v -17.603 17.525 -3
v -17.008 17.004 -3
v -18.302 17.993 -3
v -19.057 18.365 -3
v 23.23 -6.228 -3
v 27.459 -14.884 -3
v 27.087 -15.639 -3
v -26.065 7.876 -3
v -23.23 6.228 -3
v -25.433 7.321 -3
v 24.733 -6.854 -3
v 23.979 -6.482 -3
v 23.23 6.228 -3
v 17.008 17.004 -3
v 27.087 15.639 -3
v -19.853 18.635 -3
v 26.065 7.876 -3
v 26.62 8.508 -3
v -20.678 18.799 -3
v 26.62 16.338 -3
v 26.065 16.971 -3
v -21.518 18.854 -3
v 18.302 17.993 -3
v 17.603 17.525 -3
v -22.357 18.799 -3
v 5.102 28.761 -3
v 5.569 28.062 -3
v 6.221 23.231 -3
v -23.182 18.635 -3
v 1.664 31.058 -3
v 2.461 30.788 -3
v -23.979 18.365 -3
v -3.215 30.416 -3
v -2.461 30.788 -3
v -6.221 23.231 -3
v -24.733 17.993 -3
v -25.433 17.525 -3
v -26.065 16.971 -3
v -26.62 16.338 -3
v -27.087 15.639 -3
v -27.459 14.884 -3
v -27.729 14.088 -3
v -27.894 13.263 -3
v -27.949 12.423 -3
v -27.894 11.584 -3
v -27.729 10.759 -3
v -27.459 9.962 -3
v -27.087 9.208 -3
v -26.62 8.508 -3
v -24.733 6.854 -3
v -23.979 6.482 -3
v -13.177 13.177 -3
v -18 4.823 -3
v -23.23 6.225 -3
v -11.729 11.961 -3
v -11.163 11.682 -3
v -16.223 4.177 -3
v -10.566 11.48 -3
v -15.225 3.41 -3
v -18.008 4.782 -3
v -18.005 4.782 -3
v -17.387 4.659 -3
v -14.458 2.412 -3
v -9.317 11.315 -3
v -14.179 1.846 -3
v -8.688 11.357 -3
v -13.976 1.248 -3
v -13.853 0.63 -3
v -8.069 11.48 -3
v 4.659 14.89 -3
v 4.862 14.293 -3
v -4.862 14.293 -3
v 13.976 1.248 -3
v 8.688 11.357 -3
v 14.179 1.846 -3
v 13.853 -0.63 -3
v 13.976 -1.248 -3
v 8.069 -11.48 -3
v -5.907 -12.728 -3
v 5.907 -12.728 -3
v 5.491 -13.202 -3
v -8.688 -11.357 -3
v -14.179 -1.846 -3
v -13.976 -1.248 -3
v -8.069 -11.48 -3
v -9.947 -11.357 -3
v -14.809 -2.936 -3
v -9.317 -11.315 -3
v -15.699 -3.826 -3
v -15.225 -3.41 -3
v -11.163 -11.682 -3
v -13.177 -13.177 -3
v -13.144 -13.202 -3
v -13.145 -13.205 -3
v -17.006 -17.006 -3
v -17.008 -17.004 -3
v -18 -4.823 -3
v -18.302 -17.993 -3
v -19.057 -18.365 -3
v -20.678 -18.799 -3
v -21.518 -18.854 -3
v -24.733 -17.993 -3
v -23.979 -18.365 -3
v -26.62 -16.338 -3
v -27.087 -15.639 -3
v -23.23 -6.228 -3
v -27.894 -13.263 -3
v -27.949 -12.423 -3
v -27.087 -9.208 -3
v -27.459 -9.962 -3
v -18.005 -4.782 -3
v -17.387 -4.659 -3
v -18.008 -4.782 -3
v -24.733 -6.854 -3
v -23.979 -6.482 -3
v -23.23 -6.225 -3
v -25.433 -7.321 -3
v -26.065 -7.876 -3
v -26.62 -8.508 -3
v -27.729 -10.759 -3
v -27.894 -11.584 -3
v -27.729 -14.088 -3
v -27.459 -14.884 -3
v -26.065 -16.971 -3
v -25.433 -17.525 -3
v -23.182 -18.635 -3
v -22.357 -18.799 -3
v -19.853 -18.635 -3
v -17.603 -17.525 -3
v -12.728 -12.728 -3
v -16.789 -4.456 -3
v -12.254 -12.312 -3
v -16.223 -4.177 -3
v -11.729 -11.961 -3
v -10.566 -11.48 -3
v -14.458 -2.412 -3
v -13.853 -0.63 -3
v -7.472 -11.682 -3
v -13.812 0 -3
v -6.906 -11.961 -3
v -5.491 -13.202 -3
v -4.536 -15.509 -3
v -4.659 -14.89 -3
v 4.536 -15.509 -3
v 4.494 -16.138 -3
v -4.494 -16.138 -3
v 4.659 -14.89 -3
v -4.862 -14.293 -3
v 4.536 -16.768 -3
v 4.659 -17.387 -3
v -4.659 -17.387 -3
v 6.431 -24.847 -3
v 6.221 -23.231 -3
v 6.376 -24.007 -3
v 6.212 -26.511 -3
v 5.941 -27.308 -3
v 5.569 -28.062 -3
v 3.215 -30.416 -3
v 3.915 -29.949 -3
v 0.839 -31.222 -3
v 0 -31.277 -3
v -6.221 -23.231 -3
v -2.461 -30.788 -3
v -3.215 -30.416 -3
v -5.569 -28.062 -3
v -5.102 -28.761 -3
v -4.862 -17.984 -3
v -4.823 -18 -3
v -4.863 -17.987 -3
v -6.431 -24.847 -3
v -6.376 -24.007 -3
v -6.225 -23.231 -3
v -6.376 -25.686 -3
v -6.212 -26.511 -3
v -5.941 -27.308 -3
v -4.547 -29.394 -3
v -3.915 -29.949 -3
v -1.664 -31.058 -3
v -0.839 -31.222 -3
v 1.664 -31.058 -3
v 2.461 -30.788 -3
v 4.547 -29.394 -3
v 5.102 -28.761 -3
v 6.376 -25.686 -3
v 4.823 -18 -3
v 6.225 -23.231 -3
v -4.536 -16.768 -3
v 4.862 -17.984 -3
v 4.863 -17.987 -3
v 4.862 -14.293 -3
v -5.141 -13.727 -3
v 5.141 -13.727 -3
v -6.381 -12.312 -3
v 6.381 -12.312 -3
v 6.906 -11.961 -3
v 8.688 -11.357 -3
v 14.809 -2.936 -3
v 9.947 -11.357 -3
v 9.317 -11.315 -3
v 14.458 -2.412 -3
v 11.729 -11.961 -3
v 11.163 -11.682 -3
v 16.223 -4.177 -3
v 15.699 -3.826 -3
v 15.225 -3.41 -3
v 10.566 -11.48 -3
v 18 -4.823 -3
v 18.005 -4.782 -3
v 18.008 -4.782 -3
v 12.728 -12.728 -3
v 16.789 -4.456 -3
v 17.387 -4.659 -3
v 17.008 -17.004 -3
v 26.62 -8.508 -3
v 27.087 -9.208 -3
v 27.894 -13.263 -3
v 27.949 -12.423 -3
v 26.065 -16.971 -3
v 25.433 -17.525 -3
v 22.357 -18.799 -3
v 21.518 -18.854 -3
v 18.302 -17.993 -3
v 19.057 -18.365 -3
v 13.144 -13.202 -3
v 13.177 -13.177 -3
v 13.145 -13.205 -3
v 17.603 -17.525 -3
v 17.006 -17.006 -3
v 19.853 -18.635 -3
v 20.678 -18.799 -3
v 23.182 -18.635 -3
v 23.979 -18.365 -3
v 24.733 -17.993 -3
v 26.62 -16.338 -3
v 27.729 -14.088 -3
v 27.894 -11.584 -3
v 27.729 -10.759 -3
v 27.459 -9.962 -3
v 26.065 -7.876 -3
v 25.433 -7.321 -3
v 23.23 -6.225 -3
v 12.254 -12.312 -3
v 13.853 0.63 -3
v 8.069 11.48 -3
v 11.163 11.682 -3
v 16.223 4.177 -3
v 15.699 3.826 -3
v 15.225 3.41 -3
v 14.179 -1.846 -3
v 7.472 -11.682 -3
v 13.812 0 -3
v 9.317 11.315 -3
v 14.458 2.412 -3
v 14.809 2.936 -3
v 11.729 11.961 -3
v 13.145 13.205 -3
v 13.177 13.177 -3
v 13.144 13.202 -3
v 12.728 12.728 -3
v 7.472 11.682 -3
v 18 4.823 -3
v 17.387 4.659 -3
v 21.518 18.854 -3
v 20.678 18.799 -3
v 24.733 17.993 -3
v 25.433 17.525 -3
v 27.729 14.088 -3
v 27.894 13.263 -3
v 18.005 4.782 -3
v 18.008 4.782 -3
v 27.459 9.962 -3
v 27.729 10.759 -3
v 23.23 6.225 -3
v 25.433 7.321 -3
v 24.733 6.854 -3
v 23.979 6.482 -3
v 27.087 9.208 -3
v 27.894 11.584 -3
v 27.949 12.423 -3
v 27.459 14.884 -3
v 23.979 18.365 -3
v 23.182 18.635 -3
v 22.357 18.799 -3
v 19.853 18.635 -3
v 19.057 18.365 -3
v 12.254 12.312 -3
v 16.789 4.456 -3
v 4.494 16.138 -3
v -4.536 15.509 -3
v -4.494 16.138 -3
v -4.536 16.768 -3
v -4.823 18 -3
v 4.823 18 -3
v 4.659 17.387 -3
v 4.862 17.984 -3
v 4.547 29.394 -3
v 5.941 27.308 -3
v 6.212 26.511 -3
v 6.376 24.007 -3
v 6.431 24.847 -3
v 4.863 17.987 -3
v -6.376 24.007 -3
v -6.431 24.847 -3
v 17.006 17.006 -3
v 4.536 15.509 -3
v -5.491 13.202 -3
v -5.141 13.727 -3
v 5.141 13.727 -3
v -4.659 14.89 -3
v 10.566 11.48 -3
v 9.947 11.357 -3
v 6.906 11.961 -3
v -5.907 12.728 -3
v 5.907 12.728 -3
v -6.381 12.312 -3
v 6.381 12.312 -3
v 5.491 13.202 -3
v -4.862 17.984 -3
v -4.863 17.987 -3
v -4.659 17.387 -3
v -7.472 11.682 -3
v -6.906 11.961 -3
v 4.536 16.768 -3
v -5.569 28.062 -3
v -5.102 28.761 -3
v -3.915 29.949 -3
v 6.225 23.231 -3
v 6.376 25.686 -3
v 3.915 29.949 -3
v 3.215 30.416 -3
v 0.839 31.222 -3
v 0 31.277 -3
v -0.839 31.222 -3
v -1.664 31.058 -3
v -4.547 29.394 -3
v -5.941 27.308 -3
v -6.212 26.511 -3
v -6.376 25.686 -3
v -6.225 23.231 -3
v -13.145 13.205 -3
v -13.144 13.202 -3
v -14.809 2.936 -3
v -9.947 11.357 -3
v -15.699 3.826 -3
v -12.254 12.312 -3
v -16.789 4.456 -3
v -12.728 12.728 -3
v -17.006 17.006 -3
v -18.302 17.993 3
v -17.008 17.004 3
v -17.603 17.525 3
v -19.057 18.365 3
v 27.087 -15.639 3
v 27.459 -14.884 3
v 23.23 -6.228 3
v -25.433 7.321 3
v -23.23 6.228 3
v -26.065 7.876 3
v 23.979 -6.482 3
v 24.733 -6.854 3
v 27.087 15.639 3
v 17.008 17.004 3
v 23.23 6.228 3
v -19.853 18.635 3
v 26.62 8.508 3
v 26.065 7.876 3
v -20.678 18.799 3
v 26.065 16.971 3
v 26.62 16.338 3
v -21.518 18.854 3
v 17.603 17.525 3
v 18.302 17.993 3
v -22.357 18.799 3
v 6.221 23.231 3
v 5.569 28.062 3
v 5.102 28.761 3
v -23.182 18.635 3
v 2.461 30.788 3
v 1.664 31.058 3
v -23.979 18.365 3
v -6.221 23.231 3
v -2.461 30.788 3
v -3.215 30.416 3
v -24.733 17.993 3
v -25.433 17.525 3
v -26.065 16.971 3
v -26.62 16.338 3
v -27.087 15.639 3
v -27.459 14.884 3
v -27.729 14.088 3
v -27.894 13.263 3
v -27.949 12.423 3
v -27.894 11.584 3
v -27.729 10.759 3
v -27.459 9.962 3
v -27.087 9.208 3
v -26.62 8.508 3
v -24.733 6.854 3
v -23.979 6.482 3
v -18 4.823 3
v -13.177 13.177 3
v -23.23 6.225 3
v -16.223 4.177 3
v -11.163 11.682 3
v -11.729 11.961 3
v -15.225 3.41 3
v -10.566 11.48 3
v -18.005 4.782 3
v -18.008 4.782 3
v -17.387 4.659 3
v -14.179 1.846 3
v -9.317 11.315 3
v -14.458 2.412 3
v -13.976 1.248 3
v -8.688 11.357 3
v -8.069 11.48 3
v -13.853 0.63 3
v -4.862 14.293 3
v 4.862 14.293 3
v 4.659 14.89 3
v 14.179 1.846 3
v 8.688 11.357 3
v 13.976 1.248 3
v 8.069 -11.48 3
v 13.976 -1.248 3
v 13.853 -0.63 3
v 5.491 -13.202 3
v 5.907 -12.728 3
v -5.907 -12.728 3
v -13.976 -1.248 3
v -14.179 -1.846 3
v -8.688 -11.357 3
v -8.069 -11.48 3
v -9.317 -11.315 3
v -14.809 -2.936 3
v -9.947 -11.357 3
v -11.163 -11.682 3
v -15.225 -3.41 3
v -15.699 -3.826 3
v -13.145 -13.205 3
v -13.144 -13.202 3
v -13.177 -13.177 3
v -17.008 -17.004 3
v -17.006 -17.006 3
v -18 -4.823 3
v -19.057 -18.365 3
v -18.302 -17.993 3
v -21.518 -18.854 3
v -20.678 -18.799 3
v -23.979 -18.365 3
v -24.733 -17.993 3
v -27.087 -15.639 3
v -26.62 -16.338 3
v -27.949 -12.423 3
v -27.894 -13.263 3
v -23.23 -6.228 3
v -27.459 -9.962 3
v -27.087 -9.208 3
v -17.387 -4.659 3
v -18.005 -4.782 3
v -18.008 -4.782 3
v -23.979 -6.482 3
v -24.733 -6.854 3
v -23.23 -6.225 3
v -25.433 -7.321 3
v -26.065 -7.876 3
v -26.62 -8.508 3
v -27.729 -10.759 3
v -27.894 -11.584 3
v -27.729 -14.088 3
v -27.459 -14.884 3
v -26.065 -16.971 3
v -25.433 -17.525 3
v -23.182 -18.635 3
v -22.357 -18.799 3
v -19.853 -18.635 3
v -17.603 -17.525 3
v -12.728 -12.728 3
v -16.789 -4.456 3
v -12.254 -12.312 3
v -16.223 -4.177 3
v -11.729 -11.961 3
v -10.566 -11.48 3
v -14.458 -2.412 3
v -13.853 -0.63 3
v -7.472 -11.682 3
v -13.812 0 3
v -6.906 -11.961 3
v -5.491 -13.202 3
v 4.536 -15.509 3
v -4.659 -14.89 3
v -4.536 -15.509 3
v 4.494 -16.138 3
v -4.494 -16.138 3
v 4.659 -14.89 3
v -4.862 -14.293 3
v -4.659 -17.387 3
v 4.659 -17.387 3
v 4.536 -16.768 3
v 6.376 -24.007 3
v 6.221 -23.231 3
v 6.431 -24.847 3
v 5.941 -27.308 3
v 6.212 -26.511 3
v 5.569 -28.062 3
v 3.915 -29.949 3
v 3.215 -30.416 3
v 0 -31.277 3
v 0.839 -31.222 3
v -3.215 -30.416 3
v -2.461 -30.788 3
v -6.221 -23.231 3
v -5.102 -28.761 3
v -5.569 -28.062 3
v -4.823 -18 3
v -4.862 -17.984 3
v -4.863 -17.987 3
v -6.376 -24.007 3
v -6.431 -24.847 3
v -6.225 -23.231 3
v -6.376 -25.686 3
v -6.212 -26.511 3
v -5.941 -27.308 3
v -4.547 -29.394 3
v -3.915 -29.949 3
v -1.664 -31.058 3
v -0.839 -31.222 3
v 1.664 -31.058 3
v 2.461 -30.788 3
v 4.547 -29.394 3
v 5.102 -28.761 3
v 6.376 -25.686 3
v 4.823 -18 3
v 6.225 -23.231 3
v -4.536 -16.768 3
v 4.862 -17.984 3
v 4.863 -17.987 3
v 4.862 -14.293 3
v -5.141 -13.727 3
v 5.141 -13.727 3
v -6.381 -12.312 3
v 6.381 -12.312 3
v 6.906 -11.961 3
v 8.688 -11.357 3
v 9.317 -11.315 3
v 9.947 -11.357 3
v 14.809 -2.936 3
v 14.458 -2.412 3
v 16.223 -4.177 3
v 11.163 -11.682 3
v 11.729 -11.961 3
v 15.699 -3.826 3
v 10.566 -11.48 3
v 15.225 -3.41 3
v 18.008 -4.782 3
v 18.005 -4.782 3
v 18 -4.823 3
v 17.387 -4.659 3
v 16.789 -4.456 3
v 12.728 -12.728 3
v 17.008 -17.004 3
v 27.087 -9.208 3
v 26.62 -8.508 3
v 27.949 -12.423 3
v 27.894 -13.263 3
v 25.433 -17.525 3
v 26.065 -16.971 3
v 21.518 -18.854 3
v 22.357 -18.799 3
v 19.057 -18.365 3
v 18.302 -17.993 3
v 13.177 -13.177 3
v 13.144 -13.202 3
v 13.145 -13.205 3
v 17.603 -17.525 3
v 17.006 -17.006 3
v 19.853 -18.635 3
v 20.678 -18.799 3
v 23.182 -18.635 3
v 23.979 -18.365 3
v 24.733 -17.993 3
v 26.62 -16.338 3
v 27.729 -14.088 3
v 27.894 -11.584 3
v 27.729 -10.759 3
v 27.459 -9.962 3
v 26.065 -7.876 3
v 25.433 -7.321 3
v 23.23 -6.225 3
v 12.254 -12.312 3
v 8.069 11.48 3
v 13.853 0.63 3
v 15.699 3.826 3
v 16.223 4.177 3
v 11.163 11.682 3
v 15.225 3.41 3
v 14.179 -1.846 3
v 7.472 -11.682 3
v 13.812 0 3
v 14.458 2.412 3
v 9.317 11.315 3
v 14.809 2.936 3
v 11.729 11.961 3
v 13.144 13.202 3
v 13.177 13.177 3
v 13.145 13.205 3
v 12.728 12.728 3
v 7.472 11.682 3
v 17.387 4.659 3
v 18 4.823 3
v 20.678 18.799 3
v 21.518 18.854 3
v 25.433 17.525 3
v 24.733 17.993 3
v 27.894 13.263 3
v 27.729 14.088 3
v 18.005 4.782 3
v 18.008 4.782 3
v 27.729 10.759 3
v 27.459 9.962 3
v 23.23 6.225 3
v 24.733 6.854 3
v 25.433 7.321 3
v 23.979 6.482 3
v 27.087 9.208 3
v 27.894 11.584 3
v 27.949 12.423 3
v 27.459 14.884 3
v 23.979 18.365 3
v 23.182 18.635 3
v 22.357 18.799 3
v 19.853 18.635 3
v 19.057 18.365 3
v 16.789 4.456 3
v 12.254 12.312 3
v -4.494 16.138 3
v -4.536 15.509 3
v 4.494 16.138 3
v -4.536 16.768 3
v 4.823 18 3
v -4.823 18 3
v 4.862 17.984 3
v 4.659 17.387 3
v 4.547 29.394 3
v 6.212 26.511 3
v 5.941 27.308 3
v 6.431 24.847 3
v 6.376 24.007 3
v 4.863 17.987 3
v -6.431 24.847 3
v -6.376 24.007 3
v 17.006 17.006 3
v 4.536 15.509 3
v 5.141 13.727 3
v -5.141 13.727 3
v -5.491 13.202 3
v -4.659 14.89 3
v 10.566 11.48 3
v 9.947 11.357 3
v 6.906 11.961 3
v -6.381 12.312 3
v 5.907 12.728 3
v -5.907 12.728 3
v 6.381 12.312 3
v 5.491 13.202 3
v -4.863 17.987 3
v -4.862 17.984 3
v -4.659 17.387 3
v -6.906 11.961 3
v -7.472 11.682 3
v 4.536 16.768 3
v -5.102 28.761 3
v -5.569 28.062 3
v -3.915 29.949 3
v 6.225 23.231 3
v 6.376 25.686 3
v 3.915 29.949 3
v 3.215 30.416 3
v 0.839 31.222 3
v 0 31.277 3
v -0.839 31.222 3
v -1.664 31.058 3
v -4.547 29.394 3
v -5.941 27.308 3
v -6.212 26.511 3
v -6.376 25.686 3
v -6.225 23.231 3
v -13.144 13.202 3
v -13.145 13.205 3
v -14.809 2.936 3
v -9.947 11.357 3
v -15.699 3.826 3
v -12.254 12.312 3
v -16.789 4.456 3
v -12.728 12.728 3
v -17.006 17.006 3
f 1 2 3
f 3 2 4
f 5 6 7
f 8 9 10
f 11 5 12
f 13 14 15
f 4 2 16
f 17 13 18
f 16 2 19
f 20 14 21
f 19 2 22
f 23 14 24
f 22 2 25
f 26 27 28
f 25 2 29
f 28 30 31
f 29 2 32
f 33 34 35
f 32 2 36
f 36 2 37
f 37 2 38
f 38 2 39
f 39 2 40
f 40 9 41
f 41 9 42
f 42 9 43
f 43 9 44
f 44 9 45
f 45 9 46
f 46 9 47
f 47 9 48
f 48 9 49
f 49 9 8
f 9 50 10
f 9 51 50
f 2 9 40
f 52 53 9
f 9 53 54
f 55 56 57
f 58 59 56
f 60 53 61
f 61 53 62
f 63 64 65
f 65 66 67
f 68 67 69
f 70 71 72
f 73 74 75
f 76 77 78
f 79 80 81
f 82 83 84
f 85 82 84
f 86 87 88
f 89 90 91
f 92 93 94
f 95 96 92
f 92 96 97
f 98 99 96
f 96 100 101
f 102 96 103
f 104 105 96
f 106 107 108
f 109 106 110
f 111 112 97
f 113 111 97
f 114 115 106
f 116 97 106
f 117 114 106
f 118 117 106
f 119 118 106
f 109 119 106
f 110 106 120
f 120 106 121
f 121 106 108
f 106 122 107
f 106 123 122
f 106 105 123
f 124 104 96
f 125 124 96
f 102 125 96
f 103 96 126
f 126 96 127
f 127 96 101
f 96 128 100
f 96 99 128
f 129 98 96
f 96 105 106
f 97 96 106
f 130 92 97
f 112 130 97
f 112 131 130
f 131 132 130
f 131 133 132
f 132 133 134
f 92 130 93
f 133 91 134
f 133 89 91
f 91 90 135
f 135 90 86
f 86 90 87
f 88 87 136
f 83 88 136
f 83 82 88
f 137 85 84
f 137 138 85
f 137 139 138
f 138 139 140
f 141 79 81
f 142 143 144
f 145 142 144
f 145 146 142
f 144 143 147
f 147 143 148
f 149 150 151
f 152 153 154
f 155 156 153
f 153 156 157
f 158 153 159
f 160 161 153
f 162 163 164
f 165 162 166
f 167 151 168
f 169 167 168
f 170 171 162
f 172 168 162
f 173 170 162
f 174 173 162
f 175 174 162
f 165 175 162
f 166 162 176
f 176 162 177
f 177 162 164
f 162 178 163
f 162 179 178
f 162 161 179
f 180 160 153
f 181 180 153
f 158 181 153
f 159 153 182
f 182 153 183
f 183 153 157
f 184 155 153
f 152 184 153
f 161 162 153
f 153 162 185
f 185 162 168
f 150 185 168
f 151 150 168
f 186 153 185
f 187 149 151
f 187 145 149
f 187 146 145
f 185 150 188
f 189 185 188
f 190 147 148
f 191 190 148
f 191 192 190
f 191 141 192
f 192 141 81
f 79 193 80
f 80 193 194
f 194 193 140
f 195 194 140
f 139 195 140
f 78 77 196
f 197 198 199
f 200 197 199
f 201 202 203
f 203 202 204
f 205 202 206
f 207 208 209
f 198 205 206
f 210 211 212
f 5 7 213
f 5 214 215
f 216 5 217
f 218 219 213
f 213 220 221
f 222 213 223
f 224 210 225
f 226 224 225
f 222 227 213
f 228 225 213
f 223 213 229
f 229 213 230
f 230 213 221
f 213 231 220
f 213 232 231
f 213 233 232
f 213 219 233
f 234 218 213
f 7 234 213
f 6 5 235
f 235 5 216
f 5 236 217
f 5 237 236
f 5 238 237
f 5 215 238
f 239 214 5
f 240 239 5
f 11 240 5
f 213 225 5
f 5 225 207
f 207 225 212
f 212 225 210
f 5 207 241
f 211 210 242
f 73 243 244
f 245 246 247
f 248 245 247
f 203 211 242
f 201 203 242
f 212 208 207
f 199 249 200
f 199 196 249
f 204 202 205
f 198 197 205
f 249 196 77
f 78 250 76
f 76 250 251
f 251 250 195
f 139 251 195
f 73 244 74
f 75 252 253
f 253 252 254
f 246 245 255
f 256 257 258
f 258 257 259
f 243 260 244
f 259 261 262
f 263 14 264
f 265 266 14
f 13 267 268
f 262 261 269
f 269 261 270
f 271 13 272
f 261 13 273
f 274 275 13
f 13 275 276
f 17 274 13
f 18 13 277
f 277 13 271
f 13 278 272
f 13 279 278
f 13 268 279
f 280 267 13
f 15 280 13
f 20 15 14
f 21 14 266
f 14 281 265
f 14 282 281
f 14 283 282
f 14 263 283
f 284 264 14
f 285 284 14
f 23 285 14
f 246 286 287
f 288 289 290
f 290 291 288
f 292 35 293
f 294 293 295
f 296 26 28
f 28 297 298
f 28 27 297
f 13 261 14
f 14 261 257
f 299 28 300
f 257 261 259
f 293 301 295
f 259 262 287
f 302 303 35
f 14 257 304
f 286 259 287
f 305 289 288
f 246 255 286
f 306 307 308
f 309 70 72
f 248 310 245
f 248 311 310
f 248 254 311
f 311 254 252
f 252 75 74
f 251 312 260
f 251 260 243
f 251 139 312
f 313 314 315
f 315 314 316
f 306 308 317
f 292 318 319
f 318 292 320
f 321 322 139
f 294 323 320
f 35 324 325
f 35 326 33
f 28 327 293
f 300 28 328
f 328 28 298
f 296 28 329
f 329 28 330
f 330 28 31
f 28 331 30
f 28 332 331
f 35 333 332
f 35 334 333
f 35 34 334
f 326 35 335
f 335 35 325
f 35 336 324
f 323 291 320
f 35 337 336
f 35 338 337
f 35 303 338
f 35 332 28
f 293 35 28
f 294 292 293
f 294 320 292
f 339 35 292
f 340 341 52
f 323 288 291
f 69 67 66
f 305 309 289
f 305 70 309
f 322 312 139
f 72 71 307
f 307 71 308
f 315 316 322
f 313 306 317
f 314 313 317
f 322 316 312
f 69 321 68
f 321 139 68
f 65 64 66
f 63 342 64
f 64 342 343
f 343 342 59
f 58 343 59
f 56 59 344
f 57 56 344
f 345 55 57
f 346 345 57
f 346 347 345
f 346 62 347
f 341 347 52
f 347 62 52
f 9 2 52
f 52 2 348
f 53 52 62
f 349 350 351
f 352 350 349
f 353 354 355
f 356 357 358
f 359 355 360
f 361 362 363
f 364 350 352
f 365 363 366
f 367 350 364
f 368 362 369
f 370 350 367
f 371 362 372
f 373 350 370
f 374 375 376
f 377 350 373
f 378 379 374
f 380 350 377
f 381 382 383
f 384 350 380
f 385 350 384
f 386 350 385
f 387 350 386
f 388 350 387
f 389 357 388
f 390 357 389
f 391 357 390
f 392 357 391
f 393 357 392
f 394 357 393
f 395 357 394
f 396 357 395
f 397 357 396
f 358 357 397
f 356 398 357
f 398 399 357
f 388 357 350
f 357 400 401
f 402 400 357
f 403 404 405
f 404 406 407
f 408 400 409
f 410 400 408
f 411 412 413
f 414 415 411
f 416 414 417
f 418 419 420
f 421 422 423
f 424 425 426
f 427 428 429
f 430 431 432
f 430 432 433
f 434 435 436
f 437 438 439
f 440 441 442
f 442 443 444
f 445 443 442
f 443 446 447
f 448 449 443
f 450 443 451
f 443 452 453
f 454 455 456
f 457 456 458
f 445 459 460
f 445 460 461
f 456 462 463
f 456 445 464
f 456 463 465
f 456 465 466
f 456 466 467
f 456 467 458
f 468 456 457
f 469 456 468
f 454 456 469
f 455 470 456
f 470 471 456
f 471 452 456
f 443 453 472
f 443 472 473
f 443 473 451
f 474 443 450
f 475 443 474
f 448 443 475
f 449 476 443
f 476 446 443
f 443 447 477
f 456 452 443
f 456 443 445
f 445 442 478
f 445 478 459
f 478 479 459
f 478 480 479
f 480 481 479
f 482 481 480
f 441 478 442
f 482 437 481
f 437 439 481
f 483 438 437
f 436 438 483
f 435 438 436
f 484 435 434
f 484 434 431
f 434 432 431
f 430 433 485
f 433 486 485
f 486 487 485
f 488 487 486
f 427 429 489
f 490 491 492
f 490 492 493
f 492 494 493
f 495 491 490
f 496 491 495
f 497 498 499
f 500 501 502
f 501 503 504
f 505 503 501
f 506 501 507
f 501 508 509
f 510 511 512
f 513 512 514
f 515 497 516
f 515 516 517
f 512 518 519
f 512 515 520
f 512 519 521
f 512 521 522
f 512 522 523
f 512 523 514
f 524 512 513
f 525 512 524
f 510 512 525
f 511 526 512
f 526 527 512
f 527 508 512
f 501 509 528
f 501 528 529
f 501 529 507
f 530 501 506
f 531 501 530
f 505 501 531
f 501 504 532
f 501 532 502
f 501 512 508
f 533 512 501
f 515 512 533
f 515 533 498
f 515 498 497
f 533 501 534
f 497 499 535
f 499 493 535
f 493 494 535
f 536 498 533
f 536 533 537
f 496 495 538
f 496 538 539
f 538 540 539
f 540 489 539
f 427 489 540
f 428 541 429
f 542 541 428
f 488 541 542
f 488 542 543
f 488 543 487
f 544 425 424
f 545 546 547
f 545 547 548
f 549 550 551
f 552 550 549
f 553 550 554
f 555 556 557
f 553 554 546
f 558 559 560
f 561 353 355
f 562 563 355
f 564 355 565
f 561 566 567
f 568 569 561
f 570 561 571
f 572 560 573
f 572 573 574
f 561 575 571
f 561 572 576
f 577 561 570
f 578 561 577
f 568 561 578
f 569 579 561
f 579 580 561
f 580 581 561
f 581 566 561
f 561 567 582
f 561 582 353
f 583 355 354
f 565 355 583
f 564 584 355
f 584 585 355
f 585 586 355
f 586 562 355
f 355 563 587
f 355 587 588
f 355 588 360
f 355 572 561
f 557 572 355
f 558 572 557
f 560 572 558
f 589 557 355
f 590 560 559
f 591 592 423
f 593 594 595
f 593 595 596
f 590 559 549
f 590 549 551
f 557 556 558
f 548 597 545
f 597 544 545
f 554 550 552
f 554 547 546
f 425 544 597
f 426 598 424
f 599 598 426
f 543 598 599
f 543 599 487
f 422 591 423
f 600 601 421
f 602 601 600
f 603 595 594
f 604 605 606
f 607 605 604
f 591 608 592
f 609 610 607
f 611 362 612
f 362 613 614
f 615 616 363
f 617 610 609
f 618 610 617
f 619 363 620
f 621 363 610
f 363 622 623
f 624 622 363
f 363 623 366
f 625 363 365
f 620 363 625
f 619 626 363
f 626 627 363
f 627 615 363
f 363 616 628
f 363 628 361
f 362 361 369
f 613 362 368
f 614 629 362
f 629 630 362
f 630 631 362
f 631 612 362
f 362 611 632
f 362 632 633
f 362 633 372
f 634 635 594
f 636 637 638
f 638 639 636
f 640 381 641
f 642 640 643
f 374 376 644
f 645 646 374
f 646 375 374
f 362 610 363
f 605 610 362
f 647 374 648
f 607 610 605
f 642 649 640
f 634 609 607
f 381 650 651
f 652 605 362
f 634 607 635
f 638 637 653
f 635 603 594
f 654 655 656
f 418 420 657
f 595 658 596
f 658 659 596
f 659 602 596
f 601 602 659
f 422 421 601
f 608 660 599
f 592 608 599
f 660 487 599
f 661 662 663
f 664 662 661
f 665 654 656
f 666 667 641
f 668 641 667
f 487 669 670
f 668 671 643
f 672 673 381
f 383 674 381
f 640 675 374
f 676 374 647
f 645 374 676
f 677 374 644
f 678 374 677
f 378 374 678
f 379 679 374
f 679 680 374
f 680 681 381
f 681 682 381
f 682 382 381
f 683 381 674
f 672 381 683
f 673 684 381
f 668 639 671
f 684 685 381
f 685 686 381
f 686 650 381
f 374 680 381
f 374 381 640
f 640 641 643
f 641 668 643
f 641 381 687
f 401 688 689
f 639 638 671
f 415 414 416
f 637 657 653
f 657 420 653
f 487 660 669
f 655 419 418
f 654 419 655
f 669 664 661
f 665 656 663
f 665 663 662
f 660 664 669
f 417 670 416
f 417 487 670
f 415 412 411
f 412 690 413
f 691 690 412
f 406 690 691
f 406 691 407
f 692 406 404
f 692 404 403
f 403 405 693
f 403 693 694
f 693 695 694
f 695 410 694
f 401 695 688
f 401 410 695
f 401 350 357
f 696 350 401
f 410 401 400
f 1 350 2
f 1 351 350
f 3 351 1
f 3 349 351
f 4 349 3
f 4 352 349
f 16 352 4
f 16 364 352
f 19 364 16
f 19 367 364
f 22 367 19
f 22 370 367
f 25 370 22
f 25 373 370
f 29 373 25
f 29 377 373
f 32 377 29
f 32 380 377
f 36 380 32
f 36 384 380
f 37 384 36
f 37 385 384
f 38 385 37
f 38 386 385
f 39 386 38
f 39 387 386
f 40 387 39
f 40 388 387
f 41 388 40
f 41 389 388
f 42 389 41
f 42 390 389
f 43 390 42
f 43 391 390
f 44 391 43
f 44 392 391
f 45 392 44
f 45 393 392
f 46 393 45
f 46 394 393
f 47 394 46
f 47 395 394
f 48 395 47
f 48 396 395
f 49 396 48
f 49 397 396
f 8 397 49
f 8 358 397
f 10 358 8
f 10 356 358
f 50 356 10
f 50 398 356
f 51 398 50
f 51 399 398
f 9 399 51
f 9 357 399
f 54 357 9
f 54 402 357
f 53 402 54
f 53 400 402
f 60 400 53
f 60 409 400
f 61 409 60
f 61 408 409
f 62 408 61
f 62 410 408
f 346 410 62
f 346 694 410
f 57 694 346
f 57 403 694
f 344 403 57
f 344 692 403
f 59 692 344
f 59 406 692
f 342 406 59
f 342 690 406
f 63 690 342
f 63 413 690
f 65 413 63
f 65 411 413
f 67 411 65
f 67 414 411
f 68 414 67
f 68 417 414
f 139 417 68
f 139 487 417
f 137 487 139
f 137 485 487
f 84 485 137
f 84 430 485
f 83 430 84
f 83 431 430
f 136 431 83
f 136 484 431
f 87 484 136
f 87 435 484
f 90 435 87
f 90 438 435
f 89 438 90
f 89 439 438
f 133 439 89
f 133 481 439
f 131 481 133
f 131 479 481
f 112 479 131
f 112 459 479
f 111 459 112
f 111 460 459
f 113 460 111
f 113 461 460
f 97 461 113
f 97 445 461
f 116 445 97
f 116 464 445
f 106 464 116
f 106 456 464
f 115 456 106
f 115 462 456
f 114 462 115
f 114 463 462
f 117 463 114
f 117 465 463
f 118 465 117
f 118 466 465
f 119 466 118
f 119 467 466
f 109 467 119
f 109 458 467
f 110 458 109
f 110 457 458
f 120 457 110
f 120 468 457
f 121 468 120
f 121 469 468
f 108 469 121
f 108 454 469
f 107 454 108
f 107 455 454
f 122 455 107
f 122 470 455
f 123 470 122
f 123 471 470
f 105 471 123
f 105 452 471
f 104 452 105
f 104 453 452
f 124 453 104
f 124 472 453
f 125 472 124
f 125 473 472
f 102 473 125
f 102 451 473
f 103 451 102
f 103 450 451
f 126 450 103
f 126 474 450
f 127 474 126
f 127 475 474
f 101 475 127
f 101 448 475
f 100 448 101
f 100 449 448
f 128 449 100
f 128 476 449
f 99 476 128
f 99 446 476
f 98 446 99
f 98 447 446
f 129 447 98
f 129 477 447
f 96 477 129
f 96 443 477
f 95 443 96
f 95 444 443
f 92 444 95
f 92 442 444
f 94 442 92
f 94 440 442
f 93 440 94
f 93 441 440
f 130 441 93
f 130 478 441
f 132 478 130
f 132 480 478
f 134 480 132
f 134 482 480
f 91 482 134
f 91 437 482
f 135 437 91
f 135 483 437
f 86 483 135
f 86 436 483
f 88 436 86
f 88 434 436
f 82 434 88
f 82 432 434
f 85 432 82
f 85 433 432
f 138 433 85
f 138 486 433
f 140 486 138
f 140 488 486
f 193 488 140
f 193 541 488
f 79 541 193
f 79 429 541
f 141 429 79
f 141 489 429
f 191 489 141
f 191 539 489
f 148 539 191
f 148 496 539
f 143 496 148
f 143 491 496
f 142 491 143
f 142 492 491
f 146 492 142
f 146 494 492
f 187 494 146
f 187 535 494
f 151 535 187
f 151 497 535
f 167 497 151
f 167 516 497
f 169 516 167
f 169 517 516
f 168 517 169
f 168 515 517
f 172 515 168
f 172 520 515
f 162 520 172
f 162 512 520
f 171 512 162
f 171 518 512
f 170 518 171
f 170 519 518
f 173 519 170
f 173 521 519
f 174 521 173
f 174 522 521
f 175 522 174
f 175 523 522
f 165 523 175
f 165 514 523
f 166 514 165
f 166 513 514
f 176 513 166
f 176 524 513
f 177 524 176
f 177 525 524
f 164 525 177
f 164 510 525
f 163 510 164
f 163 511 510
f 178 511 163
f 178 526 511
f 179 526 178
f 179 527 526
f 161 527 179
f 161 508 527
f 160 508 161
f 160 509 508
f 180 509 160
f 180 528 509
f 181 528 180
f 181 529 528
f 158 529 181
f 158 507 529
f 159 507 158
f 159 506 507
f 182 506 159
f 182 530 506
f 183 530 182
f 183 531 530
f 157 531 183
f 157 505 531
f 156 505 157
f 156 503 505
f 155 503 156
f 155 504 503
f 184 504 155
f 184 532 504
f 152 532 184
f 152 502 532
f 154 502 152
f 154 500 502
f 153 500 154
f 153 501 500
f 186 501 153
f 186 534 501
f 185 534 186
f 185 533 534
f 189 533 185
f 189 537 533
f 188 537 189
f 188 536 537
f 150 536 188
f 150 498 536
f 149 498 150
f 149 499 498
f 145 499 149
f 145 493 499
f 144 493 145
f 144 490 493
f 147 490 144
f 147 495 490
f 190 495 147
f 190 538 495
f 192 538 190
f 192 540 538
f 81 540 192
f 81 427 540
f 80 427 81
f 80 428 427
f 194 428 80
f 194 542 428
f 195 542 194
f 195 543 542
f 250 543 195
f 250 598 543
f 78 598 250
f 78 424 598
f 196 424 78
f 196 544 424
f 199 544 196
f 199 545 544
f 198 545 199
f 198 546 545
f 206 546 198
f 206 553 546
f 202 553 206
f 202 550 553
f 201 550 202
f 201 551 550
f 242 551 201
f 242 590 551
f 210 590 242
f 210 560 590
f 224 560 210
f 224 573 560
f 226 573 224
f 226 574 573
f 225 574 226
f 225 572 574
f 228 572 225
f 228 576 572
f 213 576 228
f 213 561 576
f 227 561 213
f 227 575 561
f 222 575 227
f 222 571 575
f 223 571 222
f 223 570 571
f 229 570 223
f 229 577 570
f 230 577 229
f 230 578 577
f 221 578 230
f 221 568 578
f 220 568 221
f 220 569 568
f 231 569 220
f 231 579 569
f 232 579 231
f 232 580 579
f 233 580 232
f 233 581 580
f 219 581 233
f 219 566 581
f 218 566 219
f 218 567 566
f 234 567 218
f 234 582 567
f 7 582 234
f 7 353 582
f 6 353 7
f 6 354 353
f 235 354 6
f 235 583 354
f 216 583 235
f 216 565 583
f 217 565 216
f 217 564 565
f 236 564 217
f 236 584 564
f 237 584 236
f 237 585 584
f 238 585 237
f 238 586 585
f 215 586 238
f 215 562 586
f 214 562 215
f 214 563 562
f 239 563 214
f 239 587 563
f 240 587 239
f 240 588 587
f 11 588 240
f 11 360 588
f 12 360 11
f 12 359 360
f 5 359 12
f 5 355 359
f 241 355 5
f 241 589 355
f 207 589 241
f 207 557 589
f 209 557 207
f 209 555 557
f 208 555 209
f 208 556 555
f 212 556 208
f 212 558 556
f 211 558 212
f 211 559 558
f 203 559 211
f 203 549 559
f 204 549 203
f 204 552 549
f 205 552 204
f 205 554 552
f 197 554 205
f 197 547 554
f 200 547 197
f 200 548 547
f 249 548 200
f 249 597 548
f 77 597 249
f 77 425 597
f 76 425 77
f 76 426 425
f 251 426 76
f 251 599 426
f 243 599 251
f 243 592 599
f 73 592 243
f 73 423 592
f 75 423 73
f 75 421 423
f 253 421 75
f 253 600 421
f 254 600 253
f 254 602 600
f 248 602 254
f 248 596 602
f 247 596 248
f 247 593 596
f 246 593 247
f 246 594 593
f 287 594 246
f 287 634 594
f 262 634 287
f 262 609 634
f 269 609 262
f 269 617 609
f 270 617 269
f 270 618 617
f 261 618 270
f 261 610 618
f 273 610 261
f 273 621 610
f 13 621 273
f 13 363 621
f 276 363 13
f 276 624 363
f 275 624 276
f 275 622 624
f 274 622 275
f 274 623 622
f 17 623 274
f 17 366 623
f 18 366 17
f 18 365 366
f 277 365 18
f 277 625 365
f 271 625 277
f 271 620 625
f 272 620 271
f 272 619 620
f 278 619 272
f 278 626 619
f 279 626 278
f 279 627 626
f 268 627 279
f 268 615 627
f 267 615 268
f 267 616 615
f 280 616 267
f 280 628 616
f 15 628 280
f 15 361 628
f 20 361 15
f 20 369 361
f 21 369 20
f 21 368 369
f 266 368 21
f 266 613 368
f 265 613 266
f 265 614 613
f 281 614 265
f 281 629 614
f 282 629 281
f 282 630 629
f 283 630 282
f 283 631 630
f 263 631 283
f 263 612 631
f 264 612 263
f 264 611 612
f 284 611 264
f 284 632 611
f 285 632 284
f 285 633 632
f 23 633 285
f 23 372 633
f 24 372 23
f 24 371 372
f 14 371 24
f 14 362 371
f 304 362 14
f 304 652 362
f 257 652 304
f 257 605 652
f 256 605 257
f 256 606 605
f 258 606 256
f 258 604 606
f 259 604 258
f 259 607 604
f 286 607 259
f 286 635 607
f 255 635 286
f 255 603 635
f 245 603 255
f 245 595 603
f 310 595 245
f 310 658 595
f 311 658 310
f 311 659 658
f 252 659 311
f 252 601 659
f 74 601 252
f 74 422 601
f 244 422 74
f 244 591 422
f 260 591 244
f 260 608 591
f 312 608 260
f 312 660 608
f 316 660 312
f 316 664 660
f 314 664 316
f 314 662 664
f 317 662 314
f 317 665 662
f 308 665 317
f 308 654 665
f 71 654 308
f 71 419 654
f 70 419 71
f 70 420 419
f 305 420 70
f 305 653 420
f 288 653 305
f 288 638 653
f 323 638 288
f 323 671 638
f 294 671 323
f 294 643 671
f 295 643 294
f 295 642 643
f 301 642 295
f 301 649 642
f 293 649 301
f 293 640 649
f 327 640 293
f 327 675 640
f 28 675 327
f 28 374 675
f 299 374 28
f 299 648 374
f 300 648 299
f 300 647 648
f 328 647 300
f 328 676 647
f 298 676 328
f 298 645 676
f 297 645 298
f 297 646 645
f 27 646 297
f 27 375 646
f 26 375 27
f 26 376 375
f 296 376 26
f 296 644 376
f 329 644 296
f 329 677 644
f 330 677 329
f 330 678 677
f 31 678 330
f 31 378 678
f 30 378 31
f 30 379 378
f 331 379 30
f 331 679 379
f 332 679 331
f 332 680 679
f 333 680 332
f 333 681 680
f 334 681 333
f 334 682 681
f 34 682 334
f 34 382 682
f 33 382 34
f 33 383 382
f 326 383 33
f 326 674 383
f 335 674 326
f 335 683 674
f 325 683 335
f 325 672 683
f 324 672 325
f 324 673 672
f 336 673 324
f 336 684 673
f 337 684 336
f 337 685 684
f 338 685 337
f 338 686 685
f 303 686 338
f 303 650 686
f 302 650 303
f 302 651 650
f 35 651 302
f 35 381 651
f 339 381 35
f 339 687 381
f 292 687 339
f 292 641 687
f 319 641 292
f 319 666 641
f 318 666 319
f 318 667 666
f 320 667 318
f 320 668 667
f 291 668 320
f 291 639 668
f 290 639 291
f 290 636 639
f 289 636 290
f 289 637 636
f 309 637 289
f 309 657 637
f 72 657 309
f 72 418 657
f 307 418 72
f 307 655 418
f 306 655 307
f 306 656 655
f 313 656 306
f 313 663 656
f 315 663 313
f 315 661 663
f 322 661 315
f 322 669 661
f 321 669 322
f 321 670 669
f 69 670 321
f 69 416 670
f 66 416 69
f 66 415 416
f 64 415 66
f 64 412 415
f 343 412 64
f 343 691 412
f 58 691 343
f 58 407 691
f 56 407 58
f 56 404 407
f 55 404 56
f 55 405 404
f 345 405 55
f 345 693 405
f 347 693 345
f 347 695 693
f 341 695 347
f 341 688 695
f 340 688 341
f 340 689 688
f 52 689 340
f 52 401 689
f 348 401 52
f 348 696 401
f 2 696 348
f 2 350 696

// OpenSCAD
// stretchy bands

// (not including the curved parts)
_1_insideDiameter = 36; //[1:300]

// (not including the curved parts)
_2_outsideDiameter = 48; //[1:300]

_3_height = 6; //[1:100]

// number of loops around the ring
_4_radialCount = 6; //[2:60]

// twist
_5_twist = 0.0;

// number of slices per mm
_6_slices = 1;

// (of the arcs)
_7_resolution = 48; //[24:Low, 36:Medium, 48:High, 64:VeryHigh]



linear_extrude( height = _3_height,
	center = true,
	convexity = _4_radialCount,
	twist = _5_twist,
	slices = _5_twist == 0 ? 1 : max(1,_6_slices*_3_height) )

	stretchyShape(	_1_insideDiameter > _2_outsideDiameter ? _2_outsideDiameter/2 : _1_insideDiameter/2, 
					_2_outsideDiameter/2, 
					_4_radialCount, 
					0, 
					$fn=_7_resolution
);


module stretchyShape(r1, r2, count, thickness) {

	angle = 180/count;
	eps = 0.1;
	overlap = 2;

	cord2 = 2 * r2 * sin(angle/2);
	outsideArc = 180 + angle + overlap;
	outsideRadius = cord2/sin(90-angle/2)/2;
	outsideOffset = r2 * cos(angle/2) + cos(90-angle/2) * outsideRadius;

	insideArc = 180 - angle + overlap;
	cord1 = 2 * r1 * sin(angle/2);
	insideRadius = cord1/sin(90-angle/2)/2;
	insideOffset = r1 * cos(angle/2) + cos(90-angle/2) * insideRadius;

	union()
	{
		for(a = [0:angle*2:360])
			rotate([0,0,a])
				for(b=[0,angle])
					rotate([0,0,angle/2 - b])
						translate( [(b==0?+1:-1)*insideRadius,r1 + (r2-r1)/2,0] )
							square( [insideRadius*2+thickness, r2 - r1 + eps], center=true);

	for(a = [0:angle*2:360])
		rotate([0,0,a])
			translate([0,outsideOffset,0])
				circle( r = outsideRadius+thickness/2, center = true );
	
	difference()
	{
		circle( r = insideOffset, center = true );	
		for(a = [0:angle*2:360])
			rotate([0,0,a+angle])
				translate([0,insideOffset,0])
					circle(r = insideRadius-thickness/2, center = true );
	}
	}
}
